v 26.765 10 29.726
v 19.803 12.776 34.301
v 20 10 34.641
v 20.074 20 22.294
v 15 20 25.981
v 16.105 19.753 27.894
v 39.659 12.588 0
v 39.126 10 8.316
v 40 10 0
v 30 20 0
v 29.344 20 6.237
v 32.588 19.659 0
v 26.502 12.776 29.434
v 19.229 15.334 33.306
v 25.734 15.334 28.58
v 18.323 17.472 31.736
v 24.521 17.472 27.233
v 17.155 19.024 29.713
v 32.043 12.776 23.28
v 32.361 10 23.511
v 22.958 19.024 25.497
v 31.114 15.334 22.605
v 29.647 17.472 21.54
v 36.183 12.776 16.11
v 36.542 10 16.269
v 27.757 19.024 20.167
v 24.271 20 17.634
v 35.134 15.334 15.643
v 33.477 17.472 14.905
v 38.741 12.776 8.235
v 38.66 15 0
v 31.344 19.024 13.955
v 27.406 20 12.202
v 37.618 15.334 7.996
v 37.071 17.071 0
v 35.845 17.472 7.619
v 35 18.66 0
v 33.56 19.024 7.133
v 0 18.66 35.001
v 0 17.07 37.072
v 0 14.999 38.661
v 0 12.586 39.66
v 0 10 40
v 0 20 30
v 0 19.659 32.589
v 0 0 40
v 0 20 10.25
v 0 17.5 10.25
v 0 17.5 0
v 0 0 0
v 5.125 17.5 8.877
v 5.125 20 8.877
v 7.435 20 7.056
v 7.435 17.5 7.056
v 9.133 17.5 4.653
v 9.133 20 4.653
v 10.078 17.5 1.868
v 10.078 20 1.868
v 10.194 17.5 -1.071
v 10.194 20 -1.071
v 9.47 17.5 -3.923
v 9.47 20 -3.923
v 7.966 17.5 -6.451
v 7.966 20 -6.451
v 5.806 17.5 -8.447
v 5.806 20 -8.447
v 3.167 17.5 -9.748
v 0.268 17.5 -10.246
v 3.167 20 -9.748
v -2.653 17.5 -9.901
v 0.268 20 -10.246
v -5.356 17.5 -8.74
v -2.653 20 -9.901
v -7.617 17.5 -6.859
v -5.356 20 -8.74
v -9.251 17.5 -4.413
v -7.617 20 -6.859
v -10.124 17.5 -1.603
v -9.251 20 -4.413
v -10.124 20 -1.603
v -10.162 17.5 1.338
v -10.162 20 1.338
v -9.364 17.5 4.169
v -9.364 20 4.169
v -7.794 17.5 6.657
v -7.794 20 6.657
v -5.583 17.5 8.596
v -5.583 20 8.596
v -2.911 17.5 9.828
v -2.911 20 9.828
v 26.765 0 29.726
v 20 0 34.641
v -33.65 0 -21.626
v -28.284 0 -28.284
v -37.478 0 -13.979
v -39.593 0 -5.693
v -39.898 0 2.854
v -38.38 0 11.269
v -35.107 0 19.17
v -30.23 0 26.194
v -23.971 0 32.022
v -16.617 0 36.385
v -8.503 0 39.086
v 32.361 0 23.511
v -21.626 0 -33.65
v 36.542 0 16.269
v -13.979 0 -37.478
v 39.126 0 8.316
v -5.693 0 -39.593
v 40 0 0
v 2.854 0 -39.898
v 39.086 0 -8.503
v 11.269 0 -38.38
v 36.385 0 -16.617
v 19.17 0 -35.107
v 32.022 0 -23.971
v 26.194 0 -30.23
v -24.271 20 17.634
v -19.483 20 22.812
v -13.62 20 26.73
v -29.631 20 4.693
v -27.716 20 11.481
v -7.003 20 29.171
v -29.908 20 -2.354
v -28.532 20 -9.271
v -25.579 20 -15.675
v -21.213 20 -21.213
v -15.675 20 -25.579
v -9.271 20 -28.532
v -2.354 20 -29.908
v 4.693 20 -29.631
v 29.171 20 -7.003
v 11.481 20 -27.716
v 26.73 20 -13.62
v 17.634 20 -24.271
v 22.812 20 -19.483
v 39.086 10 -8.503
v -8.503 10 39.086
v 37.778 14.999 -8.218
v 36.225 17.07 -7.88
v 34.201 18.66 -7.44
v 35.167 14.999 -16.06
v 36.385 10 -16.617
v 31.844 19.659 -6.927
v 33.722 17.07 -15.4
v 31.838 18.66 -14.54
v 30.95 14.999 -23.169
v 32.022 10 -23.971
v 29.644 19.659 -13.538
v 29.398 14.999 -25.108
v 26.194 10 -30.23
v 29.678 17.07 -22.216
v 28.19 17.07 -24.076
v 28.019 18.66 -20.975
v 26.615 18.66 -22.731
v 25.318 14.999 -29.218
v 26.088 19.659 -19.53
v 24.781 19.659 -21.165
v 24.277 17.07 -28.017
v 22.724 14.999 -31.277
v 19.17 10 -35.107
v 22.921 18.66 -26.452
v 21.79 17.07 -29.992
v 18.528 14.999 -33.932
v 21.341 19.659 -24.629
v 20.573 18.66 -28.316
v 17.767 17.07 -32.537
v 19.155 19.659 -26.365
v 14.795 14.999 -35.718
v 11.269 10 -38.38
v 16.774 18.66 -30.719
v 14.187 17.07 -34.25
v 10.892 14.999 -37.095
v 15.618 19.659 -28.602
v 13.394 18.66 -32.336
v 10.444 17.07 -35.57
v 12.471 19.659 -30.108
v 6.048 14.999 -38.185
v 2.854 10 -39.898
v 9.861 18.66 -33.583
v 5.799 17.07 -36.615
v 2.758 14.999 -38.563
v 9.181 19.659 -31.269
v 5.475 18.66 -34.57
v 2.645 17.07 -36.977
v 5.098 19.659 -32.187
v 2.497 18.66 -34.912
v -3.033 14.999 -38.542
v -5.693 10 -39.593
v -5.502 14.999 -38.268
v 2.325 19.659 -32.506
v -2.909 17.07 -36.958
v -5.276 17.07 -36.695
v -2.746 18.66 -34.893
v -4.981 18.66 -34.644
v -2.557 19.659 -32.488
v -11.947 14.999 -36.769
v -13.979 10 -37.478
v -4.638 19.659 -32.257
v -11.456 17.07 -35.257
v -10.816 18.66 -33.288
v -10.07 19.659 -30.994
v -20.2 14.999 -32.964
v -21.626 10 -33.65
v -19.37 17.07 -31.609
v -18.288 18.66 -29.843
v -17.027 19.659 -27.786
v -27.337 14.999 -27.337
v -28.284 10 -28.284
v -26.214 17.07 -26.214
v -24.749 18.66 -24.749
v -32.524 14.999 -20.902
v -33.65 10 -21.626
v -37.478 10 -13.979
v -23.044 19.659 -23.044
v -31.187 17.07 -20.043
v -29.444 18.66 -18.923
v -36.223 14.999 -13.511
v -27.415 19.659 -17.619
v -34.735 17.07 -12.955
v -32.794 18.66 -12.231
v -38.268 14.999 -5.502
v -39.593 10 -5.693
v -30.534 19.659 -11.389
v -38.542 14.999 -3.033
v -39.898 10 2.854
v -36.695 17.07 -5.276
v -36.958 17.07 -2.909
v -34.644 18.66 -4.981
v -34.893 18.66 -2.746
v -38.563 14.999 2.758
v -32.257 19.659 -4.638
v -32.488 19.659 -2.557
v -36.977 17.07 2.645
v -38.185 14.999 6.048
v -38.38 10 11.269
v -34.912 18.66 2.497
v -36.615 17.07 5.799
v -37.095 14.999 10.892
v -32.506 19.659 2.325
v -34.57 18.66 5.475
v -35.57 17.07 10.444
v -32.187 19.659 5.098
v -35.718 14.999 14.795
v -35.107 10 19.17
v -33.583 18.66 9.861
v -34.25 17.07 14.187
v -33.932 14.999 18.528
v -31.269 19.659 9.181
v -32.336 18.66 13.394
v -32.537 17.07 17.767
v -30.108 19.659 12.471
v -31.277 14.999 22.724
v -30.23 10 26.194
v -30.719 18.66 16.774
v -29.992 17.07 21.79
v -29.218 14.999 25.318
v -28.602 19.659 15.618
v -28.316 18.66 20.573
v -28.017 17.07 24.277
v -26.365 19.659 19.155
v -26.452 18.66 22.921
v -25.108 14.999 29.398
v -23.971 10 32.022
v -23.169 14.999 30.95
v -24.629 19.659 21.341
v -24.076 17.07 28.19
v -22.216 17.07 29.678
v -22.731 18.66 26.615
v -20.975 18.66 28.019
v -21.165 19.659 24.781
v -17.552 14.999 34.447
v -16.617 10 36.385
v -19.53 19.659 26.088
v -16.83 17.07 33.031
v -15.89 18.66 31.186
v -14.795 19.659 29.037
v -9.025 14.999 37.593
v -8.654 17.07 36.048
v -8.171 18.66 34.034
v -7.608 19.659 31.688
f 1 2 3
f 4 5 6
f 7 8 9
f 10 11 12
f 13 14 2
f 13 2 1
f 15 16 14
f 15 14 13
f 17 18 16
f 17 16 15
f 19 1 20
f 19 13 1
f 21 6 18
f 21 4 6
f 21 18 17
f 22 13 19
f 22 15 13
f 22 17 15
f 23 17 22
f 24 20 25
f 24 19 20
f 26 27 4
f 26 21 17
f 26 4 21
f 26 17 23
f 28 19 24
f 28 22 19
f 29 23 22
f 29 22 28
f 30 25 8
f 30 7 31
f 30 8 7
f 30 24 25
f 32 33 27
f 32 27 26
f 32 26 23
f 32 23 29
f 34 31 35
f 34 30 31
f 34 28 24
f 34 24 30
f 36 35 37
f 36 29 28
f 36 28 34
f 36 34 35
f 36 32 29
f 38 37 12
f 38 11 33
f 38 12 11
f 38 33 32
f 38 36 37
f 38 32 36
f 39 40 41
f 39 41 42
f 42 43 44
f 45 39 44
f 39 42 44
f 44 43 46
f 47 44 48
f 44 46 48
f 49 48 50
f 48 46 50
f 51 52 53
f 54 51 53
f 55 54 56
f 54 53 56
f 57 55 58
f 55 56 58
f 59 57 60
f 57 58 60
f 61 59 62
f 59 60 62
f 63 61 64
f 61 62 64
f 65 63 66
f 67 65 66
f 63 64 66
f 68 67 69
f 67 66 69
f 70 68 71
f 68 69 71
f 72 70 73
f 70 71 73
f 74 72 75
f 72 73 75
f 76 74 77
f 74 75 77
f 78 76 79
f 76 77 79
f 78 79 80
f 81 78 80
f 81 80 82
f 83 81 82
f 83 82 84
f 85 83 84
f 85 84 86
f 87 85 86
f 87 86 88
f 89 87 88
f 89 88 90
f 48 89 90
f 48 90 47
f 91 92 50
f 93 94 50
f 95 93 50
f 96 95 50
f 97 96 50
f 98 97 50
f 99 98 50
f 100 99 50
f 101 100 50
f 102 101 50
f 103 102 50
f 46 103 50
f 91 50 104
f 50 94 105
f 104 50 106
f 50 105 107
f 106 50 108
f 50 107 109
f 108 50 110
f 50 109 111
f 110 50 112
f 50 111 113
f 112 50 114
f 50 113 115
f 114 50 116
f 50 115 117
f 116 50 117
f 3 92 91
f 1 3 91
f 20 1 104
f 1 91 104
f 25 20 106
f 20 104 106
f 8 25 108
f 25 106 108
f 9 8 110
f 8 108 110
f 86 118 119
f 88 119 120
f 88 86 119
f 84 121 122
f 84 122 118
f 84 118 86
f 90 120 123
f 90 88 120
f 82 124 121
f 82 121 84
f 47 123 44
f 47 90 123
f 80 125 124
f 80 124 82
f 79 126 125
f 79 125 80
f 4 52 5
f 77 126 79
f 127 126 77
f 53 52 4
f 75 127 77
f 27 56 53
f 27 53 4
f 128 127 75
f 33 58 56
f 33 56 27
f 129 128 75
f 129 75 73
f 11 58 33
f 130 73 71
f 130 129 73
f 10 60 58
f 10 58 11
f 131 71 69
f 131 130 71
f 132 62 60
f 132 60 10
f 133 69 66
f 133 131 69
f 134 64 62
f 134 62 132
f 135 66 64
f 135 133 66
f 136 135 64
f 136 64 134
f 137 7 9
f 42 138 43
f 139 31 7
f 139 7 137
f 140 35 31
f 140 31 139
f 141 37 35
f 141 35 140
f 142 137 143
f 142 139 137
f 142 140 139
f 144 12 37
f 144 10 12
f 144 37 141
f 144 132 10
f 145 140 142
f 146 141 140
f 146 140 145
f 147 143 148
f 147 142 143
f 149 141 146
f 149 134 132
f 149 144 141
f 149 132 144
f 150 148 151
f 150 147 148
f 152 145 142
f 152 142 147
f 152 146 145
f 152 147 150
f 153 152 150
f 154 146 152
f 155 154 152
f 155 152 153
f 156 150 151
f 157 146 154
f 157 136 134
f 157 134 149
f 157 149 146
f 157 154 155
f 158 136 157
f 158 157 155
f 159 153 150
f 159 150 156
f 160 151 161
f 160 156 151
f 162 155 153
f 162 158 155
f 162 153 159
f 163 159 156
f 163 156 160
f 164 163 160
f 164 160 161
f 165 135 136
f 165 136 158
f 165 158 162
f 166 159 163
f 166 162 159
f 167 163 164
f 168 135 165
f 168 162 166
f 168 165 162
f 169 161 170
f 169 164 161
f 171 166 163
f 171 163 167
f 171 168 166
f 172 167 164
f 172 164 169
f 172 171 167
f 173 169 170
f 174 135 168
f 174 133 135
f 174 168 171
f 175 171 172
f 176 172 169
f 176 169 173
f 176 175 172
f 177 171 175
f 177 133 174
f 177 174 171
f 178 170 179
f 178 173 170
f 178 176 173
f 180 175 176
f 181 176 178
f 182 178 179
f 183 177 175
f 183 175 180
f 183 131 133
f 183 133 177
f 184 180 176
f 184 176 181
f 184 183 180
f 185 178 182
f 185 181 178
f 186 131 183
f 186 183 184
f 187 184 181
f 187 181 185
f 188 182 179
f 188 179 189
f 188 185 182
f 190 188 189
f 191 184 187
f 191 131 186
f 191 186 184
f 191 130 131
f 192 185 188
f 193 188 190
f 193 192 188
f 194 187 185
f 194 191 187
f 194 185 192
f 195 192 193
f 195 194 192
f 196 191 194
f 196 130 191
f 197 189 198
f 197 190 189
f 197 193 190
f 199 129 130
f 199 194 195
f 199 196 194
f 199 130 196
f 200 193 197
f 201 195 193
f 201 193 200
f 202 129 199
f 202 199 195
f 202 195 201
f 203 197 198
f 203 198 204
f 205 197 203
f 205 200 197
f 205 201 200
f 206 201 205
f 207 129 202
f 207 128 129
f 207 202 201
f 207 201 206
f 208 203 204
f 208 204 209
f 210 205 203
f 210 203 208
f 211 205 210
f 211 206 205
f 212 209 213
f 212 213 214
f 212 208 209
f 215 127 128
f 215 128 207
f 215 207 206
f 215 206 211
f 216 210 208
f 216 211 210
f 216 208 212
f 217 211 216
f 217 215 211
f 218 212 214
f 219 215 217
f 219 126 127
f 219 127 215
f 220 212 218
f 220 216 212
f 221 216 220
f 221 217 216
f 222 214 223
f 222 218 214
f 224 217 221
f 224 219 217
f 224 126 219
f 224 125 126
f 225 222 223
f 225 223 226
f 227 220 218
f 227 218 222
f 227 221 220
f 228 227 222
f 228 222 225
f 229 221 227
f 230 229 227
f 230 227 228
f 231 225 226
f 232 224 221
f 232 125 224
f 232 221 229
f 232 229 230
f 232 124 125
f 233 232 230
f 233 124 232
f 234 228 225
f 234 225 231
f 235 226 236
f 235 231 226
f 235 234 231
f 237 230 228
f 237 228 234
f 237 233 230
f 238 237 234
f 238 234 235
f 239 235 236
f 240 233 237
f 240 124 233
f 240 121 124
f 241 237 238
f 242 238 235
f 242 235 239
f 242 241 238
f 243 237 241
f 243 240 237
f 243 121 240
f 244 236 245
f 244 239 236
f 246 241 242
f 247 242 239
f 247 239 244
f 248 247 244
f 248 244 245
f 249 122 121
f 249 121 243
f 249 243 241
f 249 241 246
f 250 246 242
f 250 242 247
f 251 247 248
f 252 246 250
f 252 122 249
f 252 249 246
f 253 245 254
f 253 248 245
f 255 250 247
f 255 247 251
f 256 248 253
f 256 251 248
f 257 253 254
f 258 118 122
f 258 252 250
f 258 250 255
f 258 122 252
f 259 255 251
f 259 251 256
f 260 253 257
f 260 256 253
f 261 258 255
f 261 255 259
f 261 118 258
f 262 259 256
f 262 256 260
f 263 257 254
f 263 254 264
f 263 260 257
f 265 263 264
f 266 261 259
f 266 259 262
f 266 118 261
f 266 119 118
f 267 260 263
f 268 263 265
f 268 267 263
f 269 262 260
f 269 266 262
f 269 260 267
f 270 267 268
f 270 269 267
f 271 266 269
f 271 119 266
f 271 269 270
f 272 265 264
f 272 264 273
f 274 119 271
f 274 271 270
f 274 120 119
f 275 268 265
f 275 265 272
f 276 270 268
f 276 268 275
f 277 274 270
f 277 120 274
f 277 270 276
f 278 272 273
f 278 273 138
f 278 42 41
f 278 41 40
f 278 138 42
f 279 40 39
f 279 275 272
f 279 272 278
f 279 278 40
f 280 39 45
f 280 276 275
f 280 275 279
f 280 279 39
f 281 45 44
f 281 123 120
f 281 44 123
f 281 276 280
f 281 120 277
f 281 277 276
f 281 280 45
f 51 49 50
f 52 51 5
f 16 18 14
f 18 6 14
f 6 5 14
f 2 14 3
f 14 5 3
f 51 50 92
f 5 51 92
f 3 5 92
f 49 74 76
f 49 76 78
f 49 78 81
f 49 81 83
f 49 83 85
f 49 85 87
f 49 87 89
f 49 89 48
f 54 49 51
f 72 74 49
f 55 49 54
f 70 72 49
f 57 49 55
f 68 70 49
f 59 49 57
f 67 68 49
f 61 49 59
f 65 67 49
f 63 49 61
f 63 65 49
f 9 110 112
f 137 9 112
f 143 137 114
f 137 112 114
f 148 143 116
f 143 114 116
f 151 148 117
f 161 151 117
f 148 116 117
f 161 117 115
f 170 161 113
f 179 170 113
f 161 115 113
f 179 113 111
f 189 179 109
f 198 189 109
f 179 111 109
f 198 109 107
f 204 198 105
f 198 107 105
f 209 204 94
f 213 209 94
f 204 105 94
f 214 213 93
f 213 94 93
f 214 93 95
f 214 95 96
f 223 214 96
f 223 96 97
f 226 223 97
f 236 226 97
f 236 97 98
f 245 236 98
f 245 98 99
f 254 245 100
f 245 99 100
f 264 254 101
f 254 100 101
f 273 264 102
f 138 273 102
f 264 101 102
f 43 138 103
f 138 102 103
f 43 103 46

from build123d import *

# Parameters (mm, degrees)
BOSS_EXTRUDE1_DEPTH = 20
SKETCH3_R           = 10.25
CUT_EXTRUDE1_DEPTH  = 2.5
FILLET1_R           = 10


with BuildPart() as part:
    # Sketch1 → Boss-Extrude1 (new body)
    with BuildSketch(Plane(origin=(0, 0, 0), x_dir=(1, 0, 0), z_dir=(0, 1, 0))):
        with BuildLine():
            Line((0, -40), (0, 0))
            Line((0, 0), (20, -34.641016151))
            ThreePointArc((20, -34.641016151), (34.641016151, -20), (40, 0))
            ThreePointArc((40, 0), (-28.284271247, 28.284271247), (0, -40))
        make_face()
    extrude(amount=BOSS_EXTRUDE1_DEPTH)

    # Sketch3 → Cut-Extrude1 (cut)
    with BuildSketch(Plane(origin=(0, 20, 0), x_dir=(1, 0, 0), z_dir=(0, 1, 0))):
        Circle(SKETCH3_R)
    extrude(amount=-CUT_EXTRUDE1_DEPTH, mode=Mode.SUBTRACT)

    # Fillet1
    fillet1_edges = [part.edges().sort_by_distance(p)[0] for p in [
        (-10.352761804, 20, -38.637033052),
    ]]
    fillet(fillet1_edges, radius=FILLET1_R)


solid = part.part
